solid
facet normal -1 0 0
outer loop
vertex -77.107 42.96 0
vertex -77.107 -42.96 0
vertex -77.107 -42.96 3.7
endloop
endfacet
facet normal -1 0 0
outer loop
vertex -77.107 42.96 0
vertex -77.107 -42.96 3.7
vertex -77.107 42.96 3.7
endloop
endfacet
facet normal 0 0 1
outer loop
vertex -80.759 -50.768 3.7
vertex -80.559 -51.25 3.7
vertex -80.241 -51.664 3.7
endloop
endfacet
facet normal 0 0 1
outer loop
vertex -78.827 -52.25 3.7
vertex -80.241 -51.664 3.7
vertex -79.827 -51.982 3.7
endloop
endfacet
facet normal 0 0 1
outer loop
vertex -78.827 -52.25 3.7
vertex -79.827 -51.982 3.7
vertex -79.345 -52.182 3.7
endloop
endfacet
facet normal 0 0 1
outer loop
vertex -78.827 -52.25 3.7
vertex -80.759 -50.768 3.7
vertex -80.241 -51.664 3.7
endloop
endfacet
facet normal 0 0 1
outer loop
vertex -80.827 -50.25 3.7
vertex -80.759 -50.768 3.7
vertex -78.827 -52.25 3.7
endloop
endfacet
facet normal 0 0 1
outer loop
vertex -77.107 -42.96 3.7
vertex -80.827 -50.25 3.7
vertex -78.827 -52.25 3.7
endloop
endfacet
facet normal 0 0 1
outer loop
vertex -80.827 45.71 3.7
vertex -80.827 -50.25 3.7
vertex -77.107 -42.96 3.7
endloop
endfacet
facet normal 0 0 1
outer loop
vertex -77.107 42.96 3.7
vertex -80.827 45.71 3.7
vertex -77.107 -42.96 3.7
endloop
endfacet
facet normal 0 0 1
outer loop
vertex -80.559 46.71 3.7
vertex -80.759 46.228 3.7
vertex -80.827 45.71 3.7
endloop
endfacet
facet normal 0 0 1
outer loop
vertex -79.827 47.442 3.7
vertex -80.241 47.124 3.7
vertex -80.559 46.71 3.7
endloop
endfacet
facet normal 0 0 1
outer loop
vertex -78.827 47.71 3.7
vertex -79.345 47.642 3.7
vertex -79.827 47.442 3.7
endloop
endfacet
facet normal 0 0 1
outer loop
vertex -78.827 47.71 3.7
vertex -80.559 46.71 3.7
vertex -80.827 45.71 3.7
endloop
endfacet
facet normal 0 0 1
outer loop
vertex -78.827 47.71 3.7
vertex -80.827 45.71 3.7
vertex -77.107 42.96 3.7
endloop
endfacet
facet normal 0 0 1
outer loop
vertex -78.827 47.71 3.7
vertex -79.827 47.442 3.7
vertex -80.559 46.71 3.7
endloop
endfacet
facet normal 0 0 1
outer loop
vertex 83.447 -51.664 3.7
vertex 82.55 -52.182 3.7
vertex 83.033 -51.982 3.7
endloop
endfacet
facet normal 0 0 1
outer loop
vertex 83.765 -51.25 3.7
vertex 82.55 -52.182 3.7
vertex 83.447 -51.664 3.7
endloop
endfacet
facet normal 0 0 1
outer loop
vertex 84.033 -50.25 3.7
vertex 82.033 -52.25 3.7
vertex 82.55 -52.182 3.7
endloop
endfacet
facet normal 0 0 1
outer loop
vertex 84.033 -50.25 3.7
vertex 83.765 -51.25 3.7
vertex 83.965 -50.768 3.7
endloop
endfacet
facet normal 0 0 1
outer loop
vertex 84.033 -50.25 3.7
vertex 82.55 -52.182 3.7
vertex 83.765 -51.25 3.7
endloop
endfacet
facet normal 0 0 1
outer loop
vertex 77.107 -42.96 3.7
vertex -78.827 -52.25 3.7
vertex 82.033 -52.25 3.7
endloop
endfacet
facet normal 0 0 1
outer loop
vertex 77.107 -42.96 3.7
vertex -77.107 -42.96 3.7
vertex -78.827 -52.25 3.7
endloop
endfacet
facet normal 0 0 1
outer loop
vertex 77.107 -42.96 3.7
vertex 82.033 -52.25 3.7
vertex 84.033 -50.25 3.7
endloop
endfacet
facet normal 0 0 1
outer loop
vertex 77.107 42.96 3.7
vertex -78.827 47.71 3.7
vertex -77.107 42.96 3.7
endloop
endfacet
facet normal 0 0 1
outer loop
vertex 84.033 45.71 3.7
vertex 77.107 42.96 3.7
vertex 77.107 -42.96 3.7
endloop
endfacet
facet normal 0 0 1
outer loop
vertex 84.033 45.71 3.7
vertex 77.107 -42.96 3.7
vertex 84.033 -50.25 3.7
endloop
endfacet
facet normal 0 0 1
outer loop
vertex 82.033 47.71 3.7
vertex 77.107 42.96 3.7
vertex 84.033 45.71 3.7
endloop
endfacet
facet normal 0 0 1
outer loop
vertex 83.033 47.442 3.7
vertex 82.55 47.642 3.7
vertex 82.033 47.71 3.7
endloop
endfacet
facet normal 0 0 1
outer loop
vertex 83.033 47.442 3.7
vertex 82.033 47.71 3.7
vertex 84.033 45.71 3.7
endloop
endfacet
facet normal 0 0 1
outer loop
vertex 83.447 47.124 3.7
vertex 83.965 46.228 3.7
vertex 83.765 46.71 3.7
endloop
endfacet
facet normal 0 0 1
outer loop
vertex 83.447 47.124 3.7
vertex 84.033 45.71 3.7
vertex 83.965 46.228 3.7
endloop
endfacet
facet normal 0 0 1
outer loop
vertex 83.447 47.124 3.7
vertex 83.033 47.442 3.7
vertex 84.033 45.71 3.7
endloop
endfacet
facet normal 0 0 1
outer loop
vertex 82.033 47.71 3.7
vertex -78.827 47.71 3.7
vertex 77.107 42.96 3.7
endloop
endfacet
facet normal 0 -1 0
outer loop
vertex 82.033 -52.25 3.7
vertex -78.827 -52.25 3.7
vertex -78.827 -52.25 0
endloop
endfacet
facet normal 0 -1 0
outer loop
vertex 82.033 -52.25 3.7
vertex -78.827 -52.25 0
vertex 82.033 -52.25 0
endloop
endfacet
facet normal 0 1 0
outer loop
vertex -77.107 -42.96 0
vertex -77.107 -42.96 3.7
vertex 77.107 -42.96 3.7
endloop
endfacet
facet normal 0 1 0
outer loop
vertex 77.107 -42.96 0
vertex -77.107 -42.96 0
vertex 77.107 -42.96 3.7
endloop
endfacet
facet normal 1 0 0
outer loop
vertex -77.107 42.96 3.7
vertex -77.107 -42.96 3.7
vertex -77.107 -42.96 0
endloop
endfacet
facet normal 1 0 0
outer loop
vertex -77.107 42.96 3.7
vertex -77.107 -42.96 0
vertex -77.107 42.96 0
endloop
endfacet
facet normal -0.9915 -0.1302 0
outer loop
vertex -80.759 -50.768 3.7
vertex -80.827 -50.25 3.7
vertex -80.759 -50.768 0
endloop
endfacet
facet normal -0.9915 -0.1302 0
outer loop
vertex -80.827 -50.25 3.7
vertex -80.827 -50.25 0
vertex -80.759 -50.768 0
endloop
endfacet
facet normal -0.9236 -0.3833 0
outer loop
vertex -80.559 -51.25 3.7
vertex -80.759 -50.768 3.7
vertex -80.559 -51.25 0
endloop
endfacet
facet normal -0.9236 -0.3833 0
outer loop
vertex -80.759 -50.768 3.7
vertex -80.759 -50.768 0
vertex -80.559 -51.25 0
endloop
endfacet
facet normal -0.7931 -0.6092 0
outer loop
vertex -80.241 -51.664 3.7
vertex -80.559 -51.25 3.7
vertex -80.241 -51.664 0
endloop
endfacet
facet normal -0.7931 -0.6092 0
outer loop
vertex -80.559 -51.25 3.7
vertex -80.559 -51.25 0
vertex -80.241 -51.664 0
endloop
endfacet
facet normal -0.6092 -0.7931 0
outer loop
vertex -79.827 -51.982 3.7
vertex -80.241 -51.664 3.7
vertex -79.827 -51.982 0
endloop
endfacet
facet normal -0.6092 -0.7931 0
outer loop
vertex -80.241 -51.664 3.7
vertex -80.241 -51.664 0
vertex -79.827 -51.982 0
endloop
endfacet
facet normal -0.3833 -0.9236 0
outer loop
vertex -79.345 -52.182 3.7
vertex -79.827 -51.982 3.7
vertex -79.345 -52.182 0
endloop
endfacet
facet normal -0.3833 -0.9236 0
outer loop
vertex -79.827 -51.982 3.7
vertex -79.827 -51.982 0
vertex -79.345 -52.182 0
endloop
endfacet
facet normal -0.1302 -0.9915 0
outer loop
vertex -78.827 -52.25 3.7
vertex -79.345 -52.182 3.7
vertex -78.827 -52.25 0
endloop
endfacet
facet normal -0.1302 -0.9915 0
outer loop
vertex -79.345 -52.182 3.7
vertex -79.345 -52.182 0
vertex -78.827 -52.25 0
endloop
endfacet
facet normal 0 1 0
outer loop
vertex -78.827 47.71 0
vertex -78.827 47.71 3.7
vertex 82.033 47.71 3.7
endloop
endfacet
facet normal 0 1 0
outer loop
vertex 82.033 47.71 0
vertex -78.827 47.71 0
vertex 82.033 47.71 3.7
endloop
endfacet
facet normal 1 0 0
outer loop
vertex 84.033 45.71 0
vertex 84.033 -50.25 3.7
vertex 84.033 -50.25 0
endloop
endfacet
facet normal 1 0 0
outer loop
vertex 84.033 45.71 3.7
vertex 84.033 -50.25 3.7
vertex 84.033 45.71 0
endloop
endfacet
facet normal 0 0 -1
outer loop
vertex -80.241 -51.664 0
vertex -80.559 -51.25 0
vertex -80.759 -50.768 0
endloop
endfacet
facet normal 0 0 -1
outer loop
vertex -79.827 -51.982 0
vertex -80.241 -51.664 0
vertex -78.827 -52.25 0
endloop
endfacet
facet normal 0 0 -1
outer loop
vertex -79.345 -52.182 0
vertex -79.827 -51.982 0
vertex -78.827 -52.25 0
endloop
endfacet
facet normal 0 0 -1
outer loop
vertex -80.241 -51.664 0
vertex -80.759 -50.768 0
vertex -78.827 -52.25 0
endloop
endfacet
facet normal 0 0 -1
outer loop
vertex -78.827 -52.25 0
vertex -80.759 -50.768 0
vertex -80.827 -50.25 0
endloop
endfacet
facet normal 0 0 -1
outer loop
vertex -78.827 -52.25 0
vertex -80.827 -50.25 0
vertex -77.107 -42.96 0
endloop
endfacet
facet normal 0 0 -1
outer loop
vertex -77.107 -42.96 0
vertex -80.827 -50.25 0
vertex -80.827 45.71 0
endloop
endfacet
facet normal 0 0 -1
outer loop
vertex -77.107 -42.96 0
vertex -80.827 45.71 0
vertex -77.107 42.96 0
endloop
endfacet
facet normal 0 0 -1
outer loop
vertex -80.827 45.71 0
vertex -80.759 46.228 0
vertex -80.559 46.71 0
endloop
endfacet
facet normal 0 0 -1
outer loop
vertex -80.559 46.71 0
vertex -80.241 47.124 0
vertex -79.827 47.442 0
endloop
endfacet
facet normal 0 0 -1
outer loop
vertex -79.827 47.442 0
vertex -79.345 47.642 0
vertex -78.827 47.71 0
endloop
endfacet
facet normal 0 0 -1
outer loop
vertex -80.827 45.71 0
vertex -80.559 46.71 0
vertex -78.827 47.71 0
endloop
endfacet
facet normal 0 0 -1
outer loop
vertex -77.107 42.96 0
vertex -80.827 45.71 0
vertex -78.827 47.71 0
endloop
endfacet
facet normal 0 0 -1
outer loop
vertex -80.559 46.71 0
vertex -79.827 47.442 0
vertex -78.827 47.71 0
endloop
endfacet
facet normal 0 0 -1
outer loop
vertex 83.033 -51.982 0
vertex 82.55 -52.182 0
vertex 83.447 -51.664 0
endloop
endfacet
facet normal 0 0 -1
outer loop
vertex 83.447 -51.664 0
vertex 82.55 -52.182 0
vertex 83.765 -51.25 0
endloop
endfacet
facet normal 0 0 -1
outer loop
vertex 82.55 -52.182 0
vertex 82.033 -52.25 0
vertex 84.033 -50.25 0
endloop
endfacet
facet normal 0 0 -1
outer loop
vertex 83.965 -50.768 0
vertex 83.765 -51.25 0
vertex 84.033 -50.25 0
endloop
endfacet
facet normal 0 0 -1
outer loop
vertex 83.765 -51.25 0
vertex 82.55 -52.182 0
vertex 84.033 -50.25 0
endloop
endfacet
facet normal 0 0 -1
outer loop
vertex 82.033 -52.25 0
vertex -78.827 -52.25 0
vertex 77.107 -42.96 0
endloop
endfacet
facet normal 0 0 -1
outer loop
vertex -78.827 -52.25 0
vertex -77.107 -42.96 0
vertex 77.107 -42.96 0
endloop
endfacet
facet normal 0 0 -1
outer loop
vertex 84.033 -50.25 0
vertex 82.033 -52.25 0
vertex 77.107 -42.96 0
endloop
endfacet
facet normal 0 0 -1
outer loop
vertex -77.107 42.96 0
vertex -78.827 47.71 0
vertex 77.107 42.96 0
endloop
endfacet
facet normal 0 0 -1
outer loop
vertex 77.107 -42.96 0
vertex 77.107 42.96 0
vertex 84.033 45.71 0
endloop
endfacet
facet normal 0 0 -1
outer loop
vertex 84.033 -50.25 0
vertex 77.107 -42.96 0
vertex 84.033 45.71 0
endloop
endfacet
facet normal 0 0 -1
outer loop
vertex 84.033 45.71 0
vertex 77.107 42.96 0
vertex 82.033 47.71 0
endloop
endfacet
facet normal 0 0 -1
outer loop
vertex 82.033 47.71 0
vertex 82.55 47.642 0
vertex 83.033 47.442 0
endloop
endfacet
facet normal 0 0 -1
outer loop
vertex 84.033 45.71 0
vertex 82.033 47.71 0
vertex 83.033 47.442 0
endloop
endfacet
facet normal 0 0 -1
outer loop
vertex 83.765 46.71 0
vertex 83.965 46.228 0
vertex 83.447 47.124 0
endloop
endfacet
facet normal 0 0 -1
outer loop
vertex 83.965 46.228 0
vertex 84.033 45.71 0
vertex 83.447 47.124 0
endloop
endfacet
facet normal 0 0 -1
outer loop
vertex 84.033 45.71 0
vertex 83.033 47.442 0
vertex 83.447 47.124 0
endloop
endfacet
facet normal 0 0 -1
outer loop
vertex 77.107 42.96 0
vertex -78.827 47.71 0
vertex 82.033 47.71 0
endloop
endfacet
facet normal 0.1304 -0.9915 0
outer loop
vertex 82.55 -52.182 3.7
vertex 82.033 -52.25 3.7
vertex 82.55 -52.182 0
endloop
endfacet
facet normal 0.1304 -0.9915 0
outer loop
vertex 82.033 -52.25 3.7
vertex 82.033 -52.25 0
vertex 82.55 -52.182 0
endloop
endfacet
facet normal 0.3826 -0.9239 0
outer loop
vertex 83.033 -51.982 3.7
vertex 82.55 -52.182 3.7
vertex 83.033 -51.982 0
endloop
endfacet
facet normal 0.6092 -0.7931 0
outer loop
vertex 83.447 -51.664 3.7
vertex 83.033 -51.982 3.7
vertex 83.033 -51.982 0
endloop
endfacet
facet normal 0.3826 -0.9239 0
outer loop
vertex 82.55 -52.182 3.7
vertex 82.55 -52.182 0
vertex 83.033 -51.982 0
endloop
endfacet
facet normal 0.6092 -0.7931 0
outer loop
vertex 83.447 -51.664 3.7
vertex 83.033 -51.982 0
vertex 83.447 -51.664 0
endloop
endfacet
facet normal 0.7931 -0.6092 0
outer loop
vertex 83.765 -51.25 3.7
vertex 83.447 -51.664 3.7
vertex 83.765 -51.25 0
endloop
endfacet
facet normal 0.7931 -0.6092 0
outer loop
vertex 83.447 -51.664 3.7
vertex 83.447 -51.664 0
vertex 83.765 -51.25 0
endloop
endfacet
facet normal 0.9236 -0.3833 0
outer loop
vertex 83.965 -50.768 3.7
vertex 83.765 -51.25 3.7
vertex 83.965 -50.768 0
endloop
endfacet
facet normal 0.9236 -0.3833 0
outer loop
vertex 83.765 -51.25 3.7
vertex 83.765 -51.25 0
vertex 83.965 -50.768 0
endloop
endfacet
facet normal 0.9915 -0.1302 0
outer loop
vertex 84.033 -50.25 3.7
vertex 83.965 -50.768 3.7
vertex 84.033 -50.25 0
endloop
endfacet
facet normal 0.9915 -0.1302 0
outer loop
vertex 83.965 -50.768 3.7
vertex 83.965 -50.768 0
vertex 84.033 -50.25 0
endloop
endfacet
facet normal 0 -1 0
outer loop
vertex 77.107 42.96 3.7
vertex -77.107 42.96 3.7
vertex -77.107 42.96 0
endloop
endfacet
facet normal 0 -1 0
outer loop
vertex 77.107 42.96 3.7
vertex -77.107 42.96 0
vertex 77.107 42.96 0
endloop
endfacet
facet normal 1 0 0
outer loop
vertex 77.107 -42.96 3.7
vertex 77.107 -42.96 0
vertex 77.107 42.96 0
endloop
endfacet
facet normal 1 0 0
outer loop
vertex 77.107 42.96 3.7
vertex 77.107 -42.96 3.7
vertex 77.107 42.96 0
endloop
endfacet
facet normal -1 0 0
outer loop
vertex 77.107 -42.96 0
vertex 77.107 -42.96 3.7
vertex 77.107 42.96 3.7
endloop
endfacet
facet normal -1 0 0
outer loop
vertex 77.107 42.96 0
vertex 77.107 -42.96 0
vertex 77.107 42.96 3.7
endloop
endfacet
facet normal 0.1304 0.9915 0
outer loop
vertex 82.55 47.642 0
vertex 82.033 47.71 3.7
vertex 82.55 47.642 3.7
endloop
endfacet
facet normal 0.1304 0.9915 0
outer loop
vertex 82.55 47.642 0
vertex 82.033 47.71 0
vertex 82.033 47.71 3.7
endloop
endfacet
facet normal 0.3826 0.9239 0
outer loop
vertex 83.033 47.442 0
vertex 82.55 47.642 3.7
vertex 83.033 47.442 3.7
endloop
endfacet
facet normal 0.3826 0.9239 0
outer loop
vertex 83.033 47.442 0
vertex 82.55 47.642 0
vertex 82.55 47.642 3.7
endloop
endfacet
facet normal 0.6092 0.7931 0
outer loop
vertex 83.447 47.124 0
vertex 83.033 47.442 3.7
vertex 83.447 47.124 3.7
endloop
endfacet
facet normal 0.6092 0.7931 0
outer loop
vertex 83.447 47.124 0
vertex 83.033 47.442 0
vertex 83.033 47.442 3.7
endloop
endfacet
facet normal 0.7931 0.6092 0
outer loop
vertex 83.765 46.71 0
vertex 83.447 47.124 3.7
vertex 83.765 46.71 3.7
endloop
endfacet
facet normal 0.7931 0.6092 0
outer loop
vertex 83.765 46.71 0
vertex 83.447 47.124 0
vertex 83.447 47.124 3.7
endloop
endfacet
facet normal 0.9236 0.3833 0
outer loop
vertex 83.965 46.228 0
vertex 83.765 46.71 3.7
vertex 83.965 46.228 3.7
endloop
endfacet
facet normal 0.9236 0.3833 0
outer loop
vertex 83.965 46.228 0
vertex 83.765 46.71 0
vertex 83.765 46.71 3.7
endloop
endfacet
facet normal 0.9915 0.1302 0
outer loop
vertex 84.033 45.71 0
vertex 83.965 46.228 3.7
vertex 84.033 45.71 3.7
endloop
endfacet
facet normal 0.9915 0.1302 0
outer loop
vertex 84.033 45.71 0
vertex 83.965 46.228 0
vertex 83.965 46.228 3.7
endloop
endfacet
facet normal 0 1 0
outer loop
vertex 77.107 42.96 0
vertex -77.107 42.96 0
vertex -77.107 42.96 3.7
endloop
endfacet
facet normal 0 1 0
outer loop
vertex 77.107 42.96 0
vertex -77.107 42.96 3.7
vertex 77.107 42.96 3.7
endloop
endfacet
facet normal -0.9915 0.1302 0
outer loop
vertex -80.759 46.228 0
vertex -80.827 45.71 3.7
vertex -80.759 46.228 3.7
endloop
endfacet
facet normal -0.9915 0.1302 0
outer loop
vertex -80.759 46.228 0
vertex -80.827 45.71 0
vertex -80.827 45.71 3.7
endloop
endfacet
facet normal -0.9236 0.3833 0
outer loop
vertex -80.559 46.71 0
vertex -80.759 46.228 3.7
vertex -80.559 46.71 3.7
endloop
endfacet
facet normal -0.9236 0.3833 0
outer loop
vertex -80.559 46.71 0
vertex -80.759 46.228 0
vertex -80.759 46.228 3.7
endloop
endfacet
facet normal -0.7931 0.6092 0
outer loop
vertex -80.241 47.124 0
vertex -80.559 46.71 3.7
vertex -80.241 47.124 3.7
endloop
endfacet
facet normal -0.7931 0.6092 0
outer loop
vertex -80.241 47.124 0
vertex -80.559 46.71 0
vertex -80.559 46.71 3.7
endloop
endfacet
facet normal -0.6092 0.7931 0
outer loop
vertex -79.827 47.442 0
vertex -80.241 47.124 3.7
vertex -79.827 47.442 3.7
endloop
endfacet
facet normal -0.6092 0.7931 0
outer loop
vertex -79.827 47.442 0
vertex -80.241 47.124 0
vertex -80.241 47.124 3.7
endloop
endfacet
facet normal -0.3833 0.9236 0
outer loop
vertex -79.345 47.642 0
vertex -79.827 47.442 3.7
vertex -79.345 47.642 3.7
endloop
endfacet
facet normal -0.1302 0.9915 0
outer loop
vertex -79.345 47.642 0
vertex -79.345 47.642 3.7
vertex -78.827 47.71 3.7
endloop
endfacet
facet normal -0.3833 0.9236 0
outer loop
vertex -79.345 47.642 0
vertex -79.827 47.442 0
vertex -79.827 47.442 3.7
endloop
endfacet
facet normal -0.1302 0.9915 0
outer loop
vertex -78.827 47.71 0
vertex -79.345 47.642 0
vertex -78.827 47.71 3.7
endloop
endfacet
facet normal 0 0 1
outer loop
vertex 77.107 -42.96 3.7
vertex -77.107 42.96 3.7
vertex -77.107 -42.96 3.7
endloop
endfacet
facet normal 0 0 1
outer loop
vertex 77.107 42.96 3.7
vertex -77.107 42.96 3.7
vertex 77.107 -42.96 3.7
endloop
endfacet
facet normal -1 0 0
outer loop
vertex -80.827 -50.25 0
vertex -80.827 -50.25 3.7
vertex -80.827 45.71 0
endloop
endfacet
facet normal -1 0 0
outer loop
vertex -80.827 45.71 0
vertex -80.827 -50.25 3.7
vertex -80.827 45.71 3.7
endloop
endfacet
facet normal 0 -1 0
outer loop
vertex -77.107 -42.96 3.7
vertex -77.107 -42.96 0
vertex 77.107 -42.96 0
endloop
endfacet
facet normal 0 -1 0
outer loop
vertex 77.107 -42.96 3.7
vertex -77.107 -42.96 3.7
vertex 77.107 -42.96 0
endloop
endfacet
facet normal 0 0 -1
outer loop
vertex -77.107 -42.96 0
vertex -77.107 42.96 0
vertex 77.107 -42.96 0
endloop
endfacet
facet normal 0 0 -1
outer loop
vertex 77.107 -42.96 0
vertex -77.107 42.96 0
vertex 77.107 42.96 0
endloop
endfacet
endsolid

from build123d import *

# Parameters (mm, degrees)
SKETCH1_W           = 154.2144
SKETCH1_H           = 85.92
LCD_AA_DEPTH        = 3.7
SKETCH2_W           = 164.86
SKETCH2_H           = 99.96
SKETCH2_W_2         = 154.2144
SKETCH2_H_2         = 85.92
BOSS_EXTRUDE2_DEPTH = 3.7
FILLET1_R           = 2


with BuildPart() as part:
    # Sketch1 → LCD AA (new body)
    with BuildSketch(Plane.XY):
        Rectangle(SKETCH1_W, SKETCH1_H)
    extrude(amount=LCD_AA_DEPTH)


with BuildPart() as body_2:
    # Sketch2 → Boss-Extrude2 (new, through all)
    with BuildSketch(Plane.XY.offset(3.7)):
        with Locations((1.6028, -2.27)):
            Rectangle(SKETCH2_W, SKETCH2_H)
        Rectangle(SKETCH2_W_2, SKETCH2_H_2, mode=Mode.SUBTRACT)
    extrude(amount=-BOSS_EXTRUDE2_DEPTH)

    # Fillet1
    fillet1_edges = [body_2.edges().sort_by_distance(p)[0] for p in [
        (-80.8272, 47.71, 1.85),
        (84.0328, 47.71, 1.85),
        (84.0328, -52.25, 1.85),
        (-80.8272, -52.25, 1.85),
    ]]
    fillet(fillet1_edges, radius=FILLET1_R)


solid = Compound([part.part, body_2.part])
